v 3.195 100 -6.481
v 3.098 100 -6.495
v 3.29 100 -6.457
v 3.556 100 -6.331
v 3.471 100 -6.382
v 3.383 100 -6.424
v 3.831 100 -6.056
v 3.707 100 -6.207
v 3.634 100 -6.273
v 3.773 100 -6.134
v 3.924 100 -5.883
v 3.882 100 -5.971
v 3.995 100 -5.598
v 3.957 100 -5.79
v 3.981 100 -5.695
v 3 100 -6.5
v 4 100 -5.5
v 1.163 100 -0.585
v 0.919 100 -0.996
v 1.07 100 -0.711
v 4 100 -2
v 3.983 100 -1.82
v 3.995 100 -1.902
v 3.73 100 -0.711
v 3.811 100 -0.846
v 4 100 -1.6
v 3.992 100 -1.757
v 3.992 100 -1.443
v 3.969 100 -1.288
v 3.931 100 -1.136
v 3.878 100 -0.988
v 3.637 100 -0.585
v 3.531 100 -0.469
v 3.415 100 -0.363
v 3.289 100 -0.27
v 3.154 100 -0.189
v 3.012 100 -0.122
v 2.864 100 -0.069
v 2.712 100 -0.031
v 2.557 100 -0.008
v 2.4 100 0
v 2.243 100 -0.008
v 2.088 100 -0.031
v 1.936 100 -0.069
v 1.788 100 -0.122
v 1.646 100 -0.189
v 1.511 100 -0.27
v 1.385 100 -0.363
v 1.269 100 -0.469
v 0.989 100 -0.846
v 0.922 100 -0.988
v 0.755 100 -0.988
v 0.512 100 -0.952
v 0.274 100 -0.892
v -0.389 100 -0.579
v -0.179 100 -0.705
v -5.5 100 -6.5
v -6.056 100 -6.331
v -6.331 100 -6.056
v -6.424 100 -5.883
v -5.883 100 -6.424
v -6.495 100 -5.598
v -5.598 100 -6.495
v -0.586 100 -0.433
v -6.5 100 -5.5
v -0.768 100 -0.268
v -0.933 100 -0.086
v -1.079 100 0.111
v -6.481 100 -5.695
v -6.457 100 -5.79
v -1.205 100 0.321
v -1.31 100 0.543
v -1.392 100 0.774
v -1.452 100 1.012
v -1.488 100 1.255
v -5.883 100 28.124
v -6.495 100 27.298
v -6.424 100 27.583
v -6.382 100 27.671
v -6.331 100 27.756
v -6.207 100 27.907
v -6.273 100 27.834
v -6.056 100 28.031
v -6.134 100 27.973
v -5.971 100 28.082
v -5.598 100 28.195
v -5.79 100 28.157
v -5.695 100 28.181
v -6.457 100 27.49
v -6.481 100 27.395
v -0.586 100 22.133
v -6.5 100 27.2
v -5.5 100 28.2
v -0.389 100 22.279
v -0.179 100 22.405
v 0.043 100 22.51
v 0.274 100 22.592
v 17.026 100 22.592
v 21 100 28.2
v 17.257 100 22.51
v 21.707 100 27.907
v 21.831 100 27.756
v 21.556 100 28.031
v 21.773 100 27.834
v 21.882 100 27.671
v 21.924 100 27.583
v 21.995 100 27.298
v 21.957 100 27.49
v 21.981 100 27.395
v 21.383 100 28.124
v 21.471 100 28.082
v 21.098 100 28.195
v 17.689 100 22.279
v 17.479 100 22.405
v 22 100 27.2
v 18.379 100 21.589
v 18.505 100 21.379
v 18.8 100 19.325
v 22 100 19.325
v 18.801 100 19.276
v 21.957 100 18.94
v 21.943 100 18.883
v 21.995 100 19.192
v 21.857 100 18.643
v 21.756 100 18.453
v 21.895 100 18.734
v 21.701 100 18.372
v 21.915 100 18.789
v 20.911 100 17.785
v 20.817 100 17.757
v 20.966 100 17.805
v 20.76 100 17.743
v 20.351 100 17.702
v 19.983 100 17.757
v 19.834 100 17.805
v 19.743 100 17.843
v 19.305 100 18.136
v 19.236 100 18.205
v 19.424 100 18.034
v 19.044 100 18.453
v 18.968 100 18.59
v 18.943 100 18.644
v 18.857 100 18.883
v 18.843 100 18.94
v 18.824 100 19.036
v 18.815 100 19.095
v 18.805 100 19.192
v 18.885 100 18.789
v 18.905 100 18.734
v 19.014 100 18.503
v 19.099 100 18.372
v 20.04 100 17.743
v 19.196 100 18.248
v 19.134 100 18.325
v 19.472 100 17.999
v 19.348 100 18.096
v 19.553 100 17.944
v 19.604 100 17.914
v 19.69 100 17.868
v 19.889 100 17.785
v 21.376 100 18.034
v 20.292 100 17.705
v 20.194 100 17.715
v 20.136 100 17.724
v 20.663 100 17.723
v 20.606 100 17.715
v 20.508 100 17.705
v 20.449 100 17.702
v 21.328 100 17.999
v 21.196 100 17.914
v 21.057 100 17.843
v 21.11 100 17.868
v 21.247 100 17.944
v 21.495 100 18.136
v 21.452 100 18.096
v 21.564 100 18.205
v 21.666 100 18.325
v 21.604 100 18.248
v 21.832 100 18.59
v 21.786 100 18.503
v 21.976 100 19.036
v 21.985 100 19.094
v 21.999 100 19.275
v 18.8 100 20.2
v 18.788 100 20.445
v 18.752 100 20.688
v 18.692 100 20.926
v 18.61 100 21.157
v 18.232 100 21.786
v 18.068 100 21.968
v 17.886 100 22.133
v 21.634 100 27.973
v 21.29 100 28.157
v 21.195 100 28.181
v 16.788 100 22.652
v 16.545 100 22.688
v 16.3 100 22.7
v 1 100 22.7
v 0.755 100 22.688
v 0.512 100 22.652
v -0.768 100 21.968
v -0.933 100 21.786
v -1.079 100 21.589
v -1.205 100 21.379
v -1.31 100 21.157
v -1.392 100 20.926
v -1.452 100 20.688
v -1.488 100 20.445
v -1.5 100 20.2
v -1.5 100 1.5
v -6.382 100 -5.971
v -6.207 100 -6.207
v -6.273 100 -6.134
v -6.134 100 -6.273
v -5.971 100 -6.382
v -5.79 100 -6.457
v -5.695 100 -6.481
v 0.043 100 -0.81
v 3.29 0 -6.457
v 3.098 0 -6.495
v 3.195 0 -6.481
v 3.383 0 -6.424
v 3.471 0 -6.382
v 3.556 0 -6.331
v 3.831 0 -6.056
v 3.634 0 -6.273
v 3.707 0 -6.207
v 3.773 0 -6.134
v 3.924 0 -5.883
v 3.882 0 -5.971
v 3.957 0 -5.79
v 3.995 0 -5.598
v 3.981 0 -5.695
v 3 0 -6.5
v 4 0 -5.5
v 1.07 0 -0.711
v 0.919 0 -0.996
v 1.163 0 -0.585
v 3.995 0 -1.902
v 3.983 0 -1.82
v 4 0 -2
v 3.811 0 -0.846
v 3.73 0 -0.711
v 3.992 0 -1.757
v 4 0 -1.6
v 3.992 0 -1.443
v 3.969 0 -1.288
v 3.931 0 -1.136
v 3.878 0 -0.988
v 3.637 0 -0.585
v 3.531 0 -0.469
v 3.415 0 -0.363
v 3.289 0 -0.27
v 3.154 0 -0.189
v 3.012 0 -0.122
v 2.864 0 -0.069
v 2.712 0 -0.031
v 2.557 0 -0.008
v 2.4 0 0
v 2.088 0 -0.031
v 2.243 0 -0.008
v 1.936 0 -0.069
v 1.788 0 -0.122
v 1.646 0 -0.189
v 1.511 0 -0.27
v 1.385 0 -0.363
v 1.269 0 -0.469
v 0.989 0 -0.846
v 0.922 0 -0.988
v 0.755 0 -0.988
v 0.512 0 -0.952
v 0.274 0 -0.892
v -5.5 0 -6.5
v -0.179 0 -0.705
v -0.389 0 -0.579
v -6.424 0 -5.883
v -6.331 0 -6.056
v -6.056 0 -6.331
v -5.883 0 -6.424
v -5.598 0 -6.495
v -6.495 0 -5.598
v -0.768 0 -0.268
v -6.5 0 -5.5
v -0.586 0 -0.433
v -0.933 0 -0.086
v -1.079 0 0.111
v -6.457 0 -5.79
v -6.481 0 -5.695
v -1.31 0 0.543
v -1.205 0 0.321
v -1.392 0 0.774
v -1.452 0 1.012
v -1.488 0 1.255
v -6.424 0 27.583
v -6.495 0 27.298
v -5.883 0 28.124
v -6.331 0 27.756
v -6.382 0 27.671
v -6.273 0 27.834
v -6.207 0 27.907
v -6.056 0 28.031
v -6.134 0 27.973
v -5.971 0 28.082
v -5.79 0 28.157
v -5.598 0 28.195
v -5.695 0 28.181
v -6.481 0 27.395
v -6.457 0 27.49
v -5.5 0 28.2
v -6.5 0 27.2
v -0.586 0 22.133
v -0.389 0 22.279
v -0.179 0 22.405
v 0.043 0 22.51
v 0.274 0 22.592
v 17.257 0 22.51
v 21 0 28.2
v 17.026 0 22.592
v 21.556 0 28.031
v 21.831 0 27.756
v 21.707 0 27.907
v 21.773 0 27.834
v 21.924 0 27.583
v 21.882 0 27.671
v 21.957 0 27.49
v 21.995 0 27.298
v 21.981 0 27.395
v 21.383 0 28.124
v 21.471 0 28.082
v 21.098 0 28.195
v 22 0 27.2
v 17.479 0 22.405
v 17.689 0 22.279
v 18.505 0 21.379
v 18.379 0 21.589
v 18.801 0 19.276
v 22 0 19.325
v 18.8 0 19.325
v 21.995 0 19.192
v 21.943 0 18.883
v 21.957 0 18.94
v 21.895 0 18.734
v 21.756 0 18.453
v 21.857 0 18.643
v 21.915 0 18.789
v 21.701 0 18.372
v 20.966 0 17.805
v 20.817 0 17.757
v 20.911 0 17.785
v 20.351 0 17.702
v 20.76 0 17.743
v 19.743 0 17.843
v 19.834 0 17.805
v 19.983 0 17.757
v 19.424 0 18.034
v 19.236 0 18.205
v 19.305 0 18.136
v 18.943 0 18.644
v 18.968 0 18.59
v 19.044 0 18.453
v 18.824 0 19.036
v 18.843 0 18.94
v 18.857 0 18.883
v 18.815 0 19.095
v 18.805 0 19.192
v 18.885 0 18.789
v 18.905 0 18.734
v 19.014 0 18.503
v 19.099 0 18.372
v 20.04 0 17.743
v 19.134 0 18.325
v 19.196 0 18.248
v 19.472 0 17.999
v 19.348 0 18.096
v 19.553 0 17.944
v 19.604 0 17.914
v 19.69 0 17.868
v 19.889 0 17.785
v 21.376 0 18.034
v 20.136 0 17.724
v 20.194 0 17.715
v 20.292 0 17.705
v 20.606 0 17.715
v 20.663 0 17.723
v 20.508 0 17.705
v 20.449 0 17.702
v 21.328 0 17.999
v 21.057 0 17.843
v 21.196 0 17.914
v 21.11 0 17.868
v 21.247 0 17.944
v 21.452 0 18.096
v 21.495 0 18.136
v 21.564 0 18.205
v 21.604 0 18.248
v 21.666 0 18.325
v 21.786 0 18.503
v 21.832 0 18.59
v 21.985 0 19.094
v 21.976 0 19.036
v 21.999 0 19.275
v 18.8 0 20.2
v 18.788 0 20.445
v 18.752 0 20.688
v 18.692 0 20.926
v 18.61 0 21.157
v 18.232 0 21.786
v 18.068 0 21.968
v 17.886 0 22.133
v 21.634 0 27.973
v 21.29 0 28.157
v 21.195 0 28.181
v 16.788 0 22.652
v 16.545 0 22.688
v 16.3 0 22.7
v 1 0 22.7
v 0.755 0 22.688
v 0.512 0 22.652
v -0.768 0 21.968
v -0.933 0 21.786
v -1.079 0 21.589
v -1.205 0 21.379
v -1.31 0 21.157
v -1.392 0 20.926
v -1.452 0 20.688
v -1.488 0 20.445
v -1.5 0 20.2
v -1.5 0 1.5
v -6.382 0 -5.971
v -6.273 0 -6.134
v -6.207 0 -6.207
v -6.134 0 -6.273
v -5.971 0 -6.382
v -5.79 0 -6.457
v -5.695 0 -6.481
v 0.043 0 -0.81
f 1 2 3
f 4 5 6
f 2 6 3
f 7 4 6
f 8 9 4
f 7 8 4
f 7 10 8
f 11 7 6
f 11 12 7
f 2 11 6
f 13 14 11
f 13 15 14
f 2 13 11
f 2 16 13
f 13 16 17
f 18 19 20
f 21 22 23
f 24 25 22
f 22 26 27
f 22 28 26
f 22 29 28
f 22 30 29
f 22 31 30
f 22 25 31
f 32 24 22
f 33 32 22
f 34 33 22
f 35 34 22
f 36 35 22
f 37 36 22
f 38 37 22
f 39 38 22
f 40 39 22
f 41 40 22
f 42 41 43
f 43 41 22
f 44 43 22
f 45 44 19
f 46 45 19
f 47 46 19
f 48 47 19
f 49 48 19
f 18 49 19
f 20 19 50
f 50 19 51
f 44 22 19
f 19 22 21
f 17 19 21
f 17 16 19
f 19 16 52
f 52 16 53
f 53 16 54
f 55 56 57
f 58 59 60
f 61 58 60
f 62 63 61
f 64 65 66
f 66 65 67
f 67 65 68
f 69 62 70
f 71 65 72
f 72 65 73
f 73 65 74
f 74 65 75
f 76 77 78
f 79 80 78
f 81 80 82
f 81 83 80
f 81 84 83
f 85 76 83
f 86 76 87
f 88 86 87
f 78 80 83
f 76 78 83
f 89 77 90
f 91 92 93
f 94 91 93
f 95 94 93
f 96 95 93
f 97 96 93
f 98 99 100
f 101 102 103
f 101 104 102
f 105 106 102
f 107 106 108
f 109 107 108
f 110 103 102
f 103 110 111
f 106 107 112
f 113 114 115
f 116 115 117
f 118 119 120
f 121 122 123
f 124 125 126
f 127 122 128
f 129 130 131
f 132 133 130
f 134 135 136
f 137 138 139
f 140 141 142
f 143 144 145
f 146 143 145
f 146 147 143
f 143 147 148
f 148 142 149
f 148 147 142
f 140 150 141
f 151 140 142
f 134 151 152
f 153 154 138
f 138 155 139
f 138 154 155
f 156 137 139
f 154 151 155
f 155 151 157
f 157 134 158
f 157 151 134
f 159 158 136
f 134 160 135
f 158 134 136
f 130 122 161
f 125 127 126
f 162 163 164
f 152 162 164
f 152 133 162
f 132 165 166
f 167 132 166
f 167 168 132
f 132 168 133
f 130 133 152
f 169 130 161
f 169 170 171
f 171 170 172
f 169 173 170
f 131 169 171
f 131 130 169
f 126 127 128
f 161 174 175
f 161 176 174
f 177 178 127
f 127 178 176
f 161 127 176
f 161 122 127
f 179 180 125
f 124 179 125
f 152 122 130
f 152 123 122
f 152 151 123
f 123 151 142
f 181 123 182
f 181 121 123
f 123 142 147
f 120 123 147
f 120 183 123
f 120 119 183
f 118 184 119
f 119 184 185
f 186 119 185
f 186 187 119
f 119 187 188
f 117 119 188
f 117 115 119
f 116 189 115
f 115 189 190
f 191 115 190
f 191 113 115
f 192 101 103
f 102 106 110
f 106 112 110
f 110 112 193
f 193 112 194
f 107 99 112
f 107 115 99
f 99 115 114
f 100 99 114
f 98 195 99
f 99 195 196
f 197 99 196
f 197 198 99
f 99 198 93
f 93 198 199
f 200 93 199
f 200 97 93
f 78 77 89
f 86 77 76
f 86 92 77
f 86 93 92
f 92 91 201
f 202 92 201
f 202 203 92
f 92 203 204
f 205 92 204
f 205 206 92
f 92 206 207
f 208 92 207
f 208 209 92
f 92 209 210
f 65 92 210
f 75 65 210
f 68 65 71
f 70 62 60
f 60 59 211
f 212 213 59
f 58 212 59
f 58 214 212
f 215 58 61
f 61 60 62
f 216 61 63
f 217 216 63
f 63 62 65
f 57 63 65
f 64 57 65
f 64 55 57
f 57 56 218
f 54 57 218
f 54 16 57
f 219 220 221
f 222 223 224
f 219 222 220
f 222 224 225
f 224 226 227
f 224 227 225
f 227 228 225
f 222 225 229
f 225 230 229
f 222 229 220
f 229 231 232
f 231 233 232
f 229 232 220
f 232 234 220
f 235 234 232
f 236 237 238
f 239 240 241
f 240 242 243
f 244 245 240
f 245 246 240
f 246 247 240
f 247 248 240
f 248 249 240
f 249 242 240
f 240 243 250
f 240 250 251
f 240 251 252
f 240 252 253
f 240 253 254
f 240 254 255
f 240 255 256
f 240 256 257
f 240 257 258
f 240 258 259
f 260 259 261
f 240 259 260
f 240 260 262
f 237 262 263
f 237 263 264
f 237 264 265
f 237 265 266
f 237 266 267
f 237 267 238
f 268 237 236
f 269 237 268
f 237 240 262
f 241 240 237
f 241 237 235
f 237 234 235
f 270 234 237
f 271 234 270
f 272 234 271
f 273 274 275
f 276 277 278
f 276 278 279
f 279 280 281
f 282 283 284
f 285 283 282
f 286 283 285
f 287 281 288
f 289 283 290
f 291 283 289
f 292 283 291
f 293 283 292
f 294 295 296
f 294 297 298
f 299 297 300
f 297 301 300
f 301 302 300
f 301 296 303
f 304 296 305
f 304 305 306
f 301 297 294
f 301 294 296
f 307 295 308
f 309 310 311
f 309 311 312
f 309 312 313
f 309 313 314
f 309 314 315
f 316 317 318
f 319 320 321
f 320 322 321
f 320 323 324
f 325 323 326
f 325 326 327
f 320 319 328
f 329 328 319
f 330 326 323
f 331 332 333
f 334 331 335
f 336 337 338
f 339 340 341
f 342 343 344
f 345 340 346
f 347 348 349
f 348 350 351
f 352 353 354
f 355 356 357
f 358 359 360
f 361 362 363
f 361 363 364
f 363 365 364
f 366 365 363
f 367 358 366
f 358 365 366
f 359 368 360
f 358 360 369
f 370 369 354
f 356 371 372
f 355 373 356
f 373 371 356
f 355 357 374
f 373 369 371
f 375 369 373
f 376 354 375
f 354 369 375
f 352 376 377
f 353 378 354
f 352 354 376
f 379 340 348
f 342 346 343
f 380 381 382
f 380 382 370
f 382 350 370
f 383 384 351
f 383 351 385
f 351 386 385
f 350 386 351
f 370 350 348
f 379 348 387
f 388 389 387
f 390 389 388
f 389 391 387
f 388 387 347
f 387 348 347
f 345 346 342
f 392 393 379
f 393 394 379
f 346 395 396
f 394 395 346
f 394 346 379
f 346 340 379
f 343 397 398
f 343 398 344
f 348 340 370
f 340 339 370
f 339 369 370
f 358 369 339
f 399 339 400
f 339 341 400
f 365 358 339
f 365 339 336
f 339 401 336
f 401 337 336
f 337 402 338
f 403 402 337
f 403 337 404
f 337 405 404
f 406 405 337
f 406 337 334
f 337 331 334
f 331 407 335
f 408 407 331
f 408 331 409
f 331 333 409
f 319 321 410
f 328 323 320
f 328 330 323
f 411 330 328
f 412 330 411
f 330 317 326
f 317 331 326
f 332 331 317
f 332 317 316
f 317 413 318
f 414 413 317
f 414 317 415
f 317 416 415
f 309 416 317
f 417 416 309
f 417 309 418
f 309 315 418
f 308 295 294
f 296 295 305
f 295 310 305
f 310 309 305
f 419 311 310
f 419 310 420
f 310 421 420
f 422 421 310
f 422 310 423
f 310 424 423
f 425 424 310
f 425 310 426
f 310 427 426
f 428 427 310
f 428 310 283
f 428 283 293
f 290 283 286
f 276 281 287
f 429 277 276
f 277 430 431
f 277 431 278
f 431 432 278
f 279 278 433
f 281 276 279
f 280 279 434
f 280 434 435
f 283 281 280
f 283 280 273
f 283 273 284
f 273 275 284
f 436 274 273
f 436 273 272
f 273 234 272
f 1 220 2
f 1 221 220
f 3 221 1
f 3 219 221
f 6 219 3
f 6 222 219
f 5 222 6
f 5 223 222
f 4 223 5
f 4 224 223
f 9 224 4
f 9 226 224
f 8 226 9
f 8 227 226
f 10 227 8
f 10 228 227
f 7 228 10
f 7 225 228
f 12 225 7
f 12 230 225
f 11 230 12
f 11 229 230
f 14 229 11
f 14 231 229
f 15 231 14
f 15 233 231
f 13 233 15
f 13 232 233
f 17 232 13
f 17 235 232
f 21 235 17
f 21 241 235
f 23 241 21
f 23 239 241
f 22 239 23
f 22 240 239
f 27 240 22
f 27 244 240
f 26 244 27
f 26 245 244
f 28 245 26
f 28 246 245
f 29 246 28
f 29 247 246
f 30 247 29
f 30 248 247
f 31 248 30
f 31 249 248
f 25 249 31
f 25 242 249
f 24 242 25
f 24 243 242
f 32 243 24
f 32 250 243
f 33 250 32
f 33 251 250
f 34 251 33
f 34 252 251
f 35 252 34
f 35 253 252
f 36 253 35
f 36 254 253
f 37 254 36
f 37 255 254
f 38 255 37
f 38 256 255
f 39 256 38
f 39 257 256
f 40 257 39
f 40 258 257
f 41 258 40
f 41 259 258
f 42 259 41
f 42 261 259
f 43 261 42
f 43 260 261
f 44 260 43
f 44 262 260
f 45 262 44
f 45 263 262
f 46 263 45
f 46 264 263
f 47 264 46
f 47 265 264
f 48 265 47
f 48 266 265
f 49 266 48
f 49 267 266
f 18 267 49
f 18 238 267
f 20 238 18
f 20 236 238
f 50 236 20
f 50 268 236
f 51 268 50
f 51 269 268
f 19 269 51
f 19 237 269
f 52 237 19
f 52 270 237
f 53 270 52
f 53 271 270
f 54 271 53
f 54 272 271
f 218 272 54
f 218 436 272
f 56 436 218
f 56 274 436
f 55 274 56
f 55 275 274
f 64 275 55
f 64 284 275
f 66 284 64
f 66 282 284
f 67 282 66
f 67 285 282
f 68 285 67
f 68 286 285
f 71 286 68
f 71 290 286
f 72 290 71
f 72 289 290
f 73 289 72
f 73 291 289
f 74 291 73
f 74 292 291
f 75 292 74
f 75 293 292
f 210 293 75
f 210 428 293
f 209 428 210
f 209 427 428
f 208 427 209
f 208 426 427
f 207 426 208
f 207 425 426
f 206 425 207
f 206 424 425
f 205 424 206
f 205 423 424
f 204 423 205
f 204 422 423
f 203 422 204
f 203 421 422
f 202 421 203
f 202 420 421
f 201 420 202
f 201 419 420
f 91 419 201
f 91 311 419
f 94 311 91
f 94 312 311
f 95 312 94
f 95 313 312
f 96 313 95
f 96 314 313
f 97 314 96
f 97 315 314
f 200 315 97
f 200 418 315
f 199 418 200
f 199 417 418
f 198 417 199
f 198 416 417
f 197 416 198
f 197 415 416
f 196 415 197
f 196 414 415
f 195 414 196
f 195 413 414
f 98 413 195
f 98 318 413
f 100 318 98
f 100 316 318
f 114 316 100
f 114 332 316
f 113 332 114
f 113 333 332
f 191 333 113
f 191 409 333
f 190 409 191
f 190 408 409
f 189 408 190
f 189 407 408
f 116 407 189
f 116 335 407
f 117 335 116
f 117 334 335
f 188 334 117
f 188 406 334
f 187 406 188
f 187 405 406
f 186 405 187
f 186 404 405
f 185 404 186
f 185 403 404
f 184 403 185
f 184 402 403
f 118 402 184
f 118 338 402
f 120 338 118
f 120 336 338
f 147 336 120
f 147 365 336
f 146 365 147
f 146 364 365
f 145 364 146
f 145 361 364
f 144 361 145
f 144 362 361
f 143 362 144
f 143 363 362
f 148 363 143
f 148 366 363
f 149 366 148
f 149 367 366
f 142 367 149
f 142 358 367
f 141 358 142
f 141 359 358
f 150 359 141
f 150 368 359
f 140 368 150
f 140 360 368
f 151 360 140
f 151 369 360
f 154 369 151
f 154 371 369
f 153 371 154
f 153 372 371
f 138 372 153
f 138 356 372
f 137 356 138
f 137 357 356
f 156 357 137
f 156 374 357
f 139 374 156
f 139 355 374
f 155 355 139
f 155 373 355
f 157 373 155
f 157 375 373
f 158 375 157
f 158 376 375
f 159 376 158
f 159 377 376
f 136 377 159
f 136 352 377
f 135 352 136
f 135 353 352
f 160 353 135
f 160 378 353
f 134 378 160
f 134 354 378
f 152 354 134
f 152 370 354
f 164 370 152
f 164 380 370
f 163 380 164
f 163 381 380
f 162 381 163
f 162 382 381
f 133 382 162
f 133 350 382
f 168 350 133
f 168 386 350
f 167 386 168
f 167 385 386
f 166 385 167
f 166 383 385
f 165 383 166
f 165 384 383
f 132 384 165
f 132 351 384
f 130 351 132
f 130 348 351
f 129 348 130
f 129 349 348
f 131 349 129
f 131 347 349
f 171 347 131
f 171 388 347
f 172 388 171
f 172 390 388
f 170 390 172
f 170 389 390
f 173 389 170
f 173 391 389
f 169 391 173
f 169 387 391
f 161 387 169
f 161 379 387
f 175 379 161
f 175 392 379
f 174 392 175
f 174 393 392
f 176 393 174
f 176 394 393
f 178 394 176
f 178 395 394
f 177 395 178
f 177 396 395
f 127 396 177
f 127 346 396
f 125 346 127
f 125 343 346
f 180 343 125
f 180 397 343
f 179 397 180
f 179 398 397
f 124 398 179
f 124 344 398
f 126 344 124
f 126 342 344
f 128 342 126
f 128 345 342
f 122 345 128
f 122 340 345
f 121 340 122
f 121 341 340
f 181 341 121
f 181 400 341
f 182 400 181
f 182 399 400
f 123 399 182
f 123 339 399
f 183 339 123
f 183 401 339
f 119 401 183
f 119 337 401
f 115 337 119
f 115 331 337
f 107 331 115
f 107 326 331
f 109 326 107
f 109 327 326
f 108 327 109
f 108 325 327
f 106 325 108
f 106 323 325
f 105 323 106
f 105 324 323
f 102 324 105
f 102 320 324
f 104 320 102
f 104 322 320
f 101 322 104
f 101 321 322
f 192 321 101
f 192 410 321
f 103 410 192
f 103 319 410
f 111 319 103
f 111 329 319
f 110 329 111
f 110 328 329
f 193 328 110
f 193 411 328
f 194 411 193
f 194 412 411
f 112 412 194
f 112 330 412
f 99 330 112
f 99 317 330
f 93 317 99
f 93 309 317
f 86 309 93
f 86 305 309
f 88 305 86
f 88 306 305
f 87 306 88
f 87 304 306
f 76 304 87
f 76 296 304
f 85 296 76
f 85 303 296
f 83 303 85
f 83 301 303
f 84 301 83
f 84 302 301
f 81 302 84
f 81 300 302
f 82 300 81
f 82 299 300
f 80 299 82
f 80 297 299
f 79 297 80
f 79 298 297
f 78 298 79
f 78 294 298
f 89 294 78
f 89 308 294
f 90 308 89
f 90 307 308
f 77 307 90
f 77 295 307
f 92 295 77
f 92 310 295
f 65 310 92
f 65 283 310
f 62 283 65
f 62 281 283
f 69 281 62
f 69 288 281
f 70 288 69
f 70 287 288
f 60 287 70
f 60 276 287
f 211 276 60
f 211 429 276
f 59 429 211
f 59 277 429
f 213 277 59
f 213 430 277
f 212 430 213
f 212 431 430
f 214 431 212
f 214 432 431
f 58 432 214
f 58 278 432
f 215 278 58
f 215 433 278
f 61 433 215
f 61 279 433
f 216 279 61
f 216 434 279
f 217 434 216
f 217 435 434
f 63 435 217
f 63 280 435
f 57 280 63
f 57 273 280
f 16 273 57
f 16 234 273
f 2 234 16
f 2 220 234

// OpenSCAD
// Snap clip for a filament dry box (no screws, one printed part)
//
// The clip is a C-spring. The gap between the two contact ridges is a little
// smaller than the lid + rim stack. You push the clip on from the side. The
// C-frame opens a little and then presses the lid down on the box.
//
// Measure the stack: lid top to the underside of the box rim (the same
// position as the caliper jaws). Put this value in `stack`.
//
// Coordinates (use position):
//   x = into the box. x = 0 is the outermost point of lid / rim.
//   y = along the box edge (clip width)
//   z = up. z = 0 is the underside of the box rim.

/* [Part] */
part = "assembly"; // [assembly:Assembly preview, clip:Clip (print orientation), test_set:Test set - 3 clips with different preload]

/* [Box measurements] */
// Underside of the box rim to the lid surface where the upper tooth presses (mm)
stack = 18.5;
// Distance the upper tooth reaches in over the lid, measured from x = 0 (mm)
top_reach = 22;
// Distance the bottom ridge reaches in under the rim, measured from x = 0 (mm)
bottom_reach = 4;

/* [Fit] */
// Interference: the ridge gap is this much smaller than the stack (mm). More = tighter.
preload = 0.8;
// Height of the bottom contact ridge (mm)
ridge_h = 1.0;
// Depth of the upper tooth: how far it hangs down below the top jaw (mm)
top_tooth_depth = 5;
// Width of the upper tooth (mm). The tip is a half circle of this width.
top_tooth_w = 3.2;
// Air between the spine and the outermost point of lid / rim (mm)
spine_clear = 1.5;

/* [Frame] */
// Clip width along the box edge (mm)
width = 100;
// Spine thickness (mm). Thinner = softer spring.
spine_t = 5.0;
// Jaw thickness (mm)
jaw_t = 5.5;
// Inner fillet radius (mm). It also gives space for a round lid edge.
fillet_r = 2.5;
// Outer edge radius (mm)
edge_r = 1;

/* [Hidden] */
$fn = 64;
ridge_r = 1.6;

// ---------------------------------------------------------------------------

if (part == "assembly")
  assembly();
else if (part == "clip")
  print_pose() clip(preload);
else if (part == "test_set")
  for (i = [0:2])
    translate([i * (top_reach + spine_clear + spine_t + 8), 0, 0])
      print_pose() clip([0.4, 0.8, 1.2][i], 8);

// ---------------------------------------------------------------------------

function contact_gap(p) = stack - p;

echo(str("CLIP: stack ", stack, " mm, ridge gap ", contact_gap(preload), " mm, preload ", preload, " mm"));

// Ridge: round bump along y, protrudes `ridge_h` out of the jaw face.
// `up` = 1 for the bottom jaw (bump points up), -1 for the top jaw.
module ridge2d(x, face_z, up) {
  translate([x - ridge_r, face_z + up * (ridge_h - ridge_r)]) circle(r=ridge_r);
}

// Upper tooth: a finger with a round tip. Outer edge flush with the jaw tip.
module tooth2d(x, tip_z, top_z, w) {
  hull() {
    translate([x - w / 2, tip_z + w / 2]) circle(d=w);
    translate([x - w, top_z - 0.01]) square([w, 0.5]); // root, inside the jaw
  }
}

module profile2d(p) {
  xs = -spine_clear - spine_t; // outer face of the spine
  // bottom jaw: top face at z = -ridge_h, so the ridge top is at z = 0
  bz = -ridge_h;
  // top jaw: underside at z = tz, so the upper tooth tip is at contact_gap
  tz = contact_gap(p) + top_tooth_depth;

  offset(r=edge_r) offset(delta=-edge_r)
      offset(r=-fillet_r) offset(delta=fillet_r)
          union() {
            translate([xs, bz - jaw_t]) square([spine_t, tz - bz + 2 * jaw_t]); // spine
            translate([xs, bz - jaw_t]) square([bottom_reach - xs, jaw_t]); // bottom jaw
            translate([xs, tz]) square([top_reach - xs, jaw_t]); // top jaw
            tooth2d(top_reach, contact_gap(p), tz, top_tooth_w); // upper tooth
          }
  ridge2d(bottom_reach, bz, 1);
}

module clip(p, w = width) {
  translate([0, w, 0]) rotate([90, 0, 0]) linear_extrude(w) profile2d(p);
}

// Lay the clip on its side: the C-profile is flat on the bed.
// Layers then follow the spring, which is the strongest direction.
module print_pose() {
  rotate([90, 0, 0]) children();
}

module assembly() {
  color("orange") clip(preload);
  // ghost of lid and box rim (simplified)
  %translate([0, -20, 0]) cube([60, width + 40, stack]);
  %translate([bottom_reach + 0.5, -20, -40]) cube([2, width + 40, 40]);
}
